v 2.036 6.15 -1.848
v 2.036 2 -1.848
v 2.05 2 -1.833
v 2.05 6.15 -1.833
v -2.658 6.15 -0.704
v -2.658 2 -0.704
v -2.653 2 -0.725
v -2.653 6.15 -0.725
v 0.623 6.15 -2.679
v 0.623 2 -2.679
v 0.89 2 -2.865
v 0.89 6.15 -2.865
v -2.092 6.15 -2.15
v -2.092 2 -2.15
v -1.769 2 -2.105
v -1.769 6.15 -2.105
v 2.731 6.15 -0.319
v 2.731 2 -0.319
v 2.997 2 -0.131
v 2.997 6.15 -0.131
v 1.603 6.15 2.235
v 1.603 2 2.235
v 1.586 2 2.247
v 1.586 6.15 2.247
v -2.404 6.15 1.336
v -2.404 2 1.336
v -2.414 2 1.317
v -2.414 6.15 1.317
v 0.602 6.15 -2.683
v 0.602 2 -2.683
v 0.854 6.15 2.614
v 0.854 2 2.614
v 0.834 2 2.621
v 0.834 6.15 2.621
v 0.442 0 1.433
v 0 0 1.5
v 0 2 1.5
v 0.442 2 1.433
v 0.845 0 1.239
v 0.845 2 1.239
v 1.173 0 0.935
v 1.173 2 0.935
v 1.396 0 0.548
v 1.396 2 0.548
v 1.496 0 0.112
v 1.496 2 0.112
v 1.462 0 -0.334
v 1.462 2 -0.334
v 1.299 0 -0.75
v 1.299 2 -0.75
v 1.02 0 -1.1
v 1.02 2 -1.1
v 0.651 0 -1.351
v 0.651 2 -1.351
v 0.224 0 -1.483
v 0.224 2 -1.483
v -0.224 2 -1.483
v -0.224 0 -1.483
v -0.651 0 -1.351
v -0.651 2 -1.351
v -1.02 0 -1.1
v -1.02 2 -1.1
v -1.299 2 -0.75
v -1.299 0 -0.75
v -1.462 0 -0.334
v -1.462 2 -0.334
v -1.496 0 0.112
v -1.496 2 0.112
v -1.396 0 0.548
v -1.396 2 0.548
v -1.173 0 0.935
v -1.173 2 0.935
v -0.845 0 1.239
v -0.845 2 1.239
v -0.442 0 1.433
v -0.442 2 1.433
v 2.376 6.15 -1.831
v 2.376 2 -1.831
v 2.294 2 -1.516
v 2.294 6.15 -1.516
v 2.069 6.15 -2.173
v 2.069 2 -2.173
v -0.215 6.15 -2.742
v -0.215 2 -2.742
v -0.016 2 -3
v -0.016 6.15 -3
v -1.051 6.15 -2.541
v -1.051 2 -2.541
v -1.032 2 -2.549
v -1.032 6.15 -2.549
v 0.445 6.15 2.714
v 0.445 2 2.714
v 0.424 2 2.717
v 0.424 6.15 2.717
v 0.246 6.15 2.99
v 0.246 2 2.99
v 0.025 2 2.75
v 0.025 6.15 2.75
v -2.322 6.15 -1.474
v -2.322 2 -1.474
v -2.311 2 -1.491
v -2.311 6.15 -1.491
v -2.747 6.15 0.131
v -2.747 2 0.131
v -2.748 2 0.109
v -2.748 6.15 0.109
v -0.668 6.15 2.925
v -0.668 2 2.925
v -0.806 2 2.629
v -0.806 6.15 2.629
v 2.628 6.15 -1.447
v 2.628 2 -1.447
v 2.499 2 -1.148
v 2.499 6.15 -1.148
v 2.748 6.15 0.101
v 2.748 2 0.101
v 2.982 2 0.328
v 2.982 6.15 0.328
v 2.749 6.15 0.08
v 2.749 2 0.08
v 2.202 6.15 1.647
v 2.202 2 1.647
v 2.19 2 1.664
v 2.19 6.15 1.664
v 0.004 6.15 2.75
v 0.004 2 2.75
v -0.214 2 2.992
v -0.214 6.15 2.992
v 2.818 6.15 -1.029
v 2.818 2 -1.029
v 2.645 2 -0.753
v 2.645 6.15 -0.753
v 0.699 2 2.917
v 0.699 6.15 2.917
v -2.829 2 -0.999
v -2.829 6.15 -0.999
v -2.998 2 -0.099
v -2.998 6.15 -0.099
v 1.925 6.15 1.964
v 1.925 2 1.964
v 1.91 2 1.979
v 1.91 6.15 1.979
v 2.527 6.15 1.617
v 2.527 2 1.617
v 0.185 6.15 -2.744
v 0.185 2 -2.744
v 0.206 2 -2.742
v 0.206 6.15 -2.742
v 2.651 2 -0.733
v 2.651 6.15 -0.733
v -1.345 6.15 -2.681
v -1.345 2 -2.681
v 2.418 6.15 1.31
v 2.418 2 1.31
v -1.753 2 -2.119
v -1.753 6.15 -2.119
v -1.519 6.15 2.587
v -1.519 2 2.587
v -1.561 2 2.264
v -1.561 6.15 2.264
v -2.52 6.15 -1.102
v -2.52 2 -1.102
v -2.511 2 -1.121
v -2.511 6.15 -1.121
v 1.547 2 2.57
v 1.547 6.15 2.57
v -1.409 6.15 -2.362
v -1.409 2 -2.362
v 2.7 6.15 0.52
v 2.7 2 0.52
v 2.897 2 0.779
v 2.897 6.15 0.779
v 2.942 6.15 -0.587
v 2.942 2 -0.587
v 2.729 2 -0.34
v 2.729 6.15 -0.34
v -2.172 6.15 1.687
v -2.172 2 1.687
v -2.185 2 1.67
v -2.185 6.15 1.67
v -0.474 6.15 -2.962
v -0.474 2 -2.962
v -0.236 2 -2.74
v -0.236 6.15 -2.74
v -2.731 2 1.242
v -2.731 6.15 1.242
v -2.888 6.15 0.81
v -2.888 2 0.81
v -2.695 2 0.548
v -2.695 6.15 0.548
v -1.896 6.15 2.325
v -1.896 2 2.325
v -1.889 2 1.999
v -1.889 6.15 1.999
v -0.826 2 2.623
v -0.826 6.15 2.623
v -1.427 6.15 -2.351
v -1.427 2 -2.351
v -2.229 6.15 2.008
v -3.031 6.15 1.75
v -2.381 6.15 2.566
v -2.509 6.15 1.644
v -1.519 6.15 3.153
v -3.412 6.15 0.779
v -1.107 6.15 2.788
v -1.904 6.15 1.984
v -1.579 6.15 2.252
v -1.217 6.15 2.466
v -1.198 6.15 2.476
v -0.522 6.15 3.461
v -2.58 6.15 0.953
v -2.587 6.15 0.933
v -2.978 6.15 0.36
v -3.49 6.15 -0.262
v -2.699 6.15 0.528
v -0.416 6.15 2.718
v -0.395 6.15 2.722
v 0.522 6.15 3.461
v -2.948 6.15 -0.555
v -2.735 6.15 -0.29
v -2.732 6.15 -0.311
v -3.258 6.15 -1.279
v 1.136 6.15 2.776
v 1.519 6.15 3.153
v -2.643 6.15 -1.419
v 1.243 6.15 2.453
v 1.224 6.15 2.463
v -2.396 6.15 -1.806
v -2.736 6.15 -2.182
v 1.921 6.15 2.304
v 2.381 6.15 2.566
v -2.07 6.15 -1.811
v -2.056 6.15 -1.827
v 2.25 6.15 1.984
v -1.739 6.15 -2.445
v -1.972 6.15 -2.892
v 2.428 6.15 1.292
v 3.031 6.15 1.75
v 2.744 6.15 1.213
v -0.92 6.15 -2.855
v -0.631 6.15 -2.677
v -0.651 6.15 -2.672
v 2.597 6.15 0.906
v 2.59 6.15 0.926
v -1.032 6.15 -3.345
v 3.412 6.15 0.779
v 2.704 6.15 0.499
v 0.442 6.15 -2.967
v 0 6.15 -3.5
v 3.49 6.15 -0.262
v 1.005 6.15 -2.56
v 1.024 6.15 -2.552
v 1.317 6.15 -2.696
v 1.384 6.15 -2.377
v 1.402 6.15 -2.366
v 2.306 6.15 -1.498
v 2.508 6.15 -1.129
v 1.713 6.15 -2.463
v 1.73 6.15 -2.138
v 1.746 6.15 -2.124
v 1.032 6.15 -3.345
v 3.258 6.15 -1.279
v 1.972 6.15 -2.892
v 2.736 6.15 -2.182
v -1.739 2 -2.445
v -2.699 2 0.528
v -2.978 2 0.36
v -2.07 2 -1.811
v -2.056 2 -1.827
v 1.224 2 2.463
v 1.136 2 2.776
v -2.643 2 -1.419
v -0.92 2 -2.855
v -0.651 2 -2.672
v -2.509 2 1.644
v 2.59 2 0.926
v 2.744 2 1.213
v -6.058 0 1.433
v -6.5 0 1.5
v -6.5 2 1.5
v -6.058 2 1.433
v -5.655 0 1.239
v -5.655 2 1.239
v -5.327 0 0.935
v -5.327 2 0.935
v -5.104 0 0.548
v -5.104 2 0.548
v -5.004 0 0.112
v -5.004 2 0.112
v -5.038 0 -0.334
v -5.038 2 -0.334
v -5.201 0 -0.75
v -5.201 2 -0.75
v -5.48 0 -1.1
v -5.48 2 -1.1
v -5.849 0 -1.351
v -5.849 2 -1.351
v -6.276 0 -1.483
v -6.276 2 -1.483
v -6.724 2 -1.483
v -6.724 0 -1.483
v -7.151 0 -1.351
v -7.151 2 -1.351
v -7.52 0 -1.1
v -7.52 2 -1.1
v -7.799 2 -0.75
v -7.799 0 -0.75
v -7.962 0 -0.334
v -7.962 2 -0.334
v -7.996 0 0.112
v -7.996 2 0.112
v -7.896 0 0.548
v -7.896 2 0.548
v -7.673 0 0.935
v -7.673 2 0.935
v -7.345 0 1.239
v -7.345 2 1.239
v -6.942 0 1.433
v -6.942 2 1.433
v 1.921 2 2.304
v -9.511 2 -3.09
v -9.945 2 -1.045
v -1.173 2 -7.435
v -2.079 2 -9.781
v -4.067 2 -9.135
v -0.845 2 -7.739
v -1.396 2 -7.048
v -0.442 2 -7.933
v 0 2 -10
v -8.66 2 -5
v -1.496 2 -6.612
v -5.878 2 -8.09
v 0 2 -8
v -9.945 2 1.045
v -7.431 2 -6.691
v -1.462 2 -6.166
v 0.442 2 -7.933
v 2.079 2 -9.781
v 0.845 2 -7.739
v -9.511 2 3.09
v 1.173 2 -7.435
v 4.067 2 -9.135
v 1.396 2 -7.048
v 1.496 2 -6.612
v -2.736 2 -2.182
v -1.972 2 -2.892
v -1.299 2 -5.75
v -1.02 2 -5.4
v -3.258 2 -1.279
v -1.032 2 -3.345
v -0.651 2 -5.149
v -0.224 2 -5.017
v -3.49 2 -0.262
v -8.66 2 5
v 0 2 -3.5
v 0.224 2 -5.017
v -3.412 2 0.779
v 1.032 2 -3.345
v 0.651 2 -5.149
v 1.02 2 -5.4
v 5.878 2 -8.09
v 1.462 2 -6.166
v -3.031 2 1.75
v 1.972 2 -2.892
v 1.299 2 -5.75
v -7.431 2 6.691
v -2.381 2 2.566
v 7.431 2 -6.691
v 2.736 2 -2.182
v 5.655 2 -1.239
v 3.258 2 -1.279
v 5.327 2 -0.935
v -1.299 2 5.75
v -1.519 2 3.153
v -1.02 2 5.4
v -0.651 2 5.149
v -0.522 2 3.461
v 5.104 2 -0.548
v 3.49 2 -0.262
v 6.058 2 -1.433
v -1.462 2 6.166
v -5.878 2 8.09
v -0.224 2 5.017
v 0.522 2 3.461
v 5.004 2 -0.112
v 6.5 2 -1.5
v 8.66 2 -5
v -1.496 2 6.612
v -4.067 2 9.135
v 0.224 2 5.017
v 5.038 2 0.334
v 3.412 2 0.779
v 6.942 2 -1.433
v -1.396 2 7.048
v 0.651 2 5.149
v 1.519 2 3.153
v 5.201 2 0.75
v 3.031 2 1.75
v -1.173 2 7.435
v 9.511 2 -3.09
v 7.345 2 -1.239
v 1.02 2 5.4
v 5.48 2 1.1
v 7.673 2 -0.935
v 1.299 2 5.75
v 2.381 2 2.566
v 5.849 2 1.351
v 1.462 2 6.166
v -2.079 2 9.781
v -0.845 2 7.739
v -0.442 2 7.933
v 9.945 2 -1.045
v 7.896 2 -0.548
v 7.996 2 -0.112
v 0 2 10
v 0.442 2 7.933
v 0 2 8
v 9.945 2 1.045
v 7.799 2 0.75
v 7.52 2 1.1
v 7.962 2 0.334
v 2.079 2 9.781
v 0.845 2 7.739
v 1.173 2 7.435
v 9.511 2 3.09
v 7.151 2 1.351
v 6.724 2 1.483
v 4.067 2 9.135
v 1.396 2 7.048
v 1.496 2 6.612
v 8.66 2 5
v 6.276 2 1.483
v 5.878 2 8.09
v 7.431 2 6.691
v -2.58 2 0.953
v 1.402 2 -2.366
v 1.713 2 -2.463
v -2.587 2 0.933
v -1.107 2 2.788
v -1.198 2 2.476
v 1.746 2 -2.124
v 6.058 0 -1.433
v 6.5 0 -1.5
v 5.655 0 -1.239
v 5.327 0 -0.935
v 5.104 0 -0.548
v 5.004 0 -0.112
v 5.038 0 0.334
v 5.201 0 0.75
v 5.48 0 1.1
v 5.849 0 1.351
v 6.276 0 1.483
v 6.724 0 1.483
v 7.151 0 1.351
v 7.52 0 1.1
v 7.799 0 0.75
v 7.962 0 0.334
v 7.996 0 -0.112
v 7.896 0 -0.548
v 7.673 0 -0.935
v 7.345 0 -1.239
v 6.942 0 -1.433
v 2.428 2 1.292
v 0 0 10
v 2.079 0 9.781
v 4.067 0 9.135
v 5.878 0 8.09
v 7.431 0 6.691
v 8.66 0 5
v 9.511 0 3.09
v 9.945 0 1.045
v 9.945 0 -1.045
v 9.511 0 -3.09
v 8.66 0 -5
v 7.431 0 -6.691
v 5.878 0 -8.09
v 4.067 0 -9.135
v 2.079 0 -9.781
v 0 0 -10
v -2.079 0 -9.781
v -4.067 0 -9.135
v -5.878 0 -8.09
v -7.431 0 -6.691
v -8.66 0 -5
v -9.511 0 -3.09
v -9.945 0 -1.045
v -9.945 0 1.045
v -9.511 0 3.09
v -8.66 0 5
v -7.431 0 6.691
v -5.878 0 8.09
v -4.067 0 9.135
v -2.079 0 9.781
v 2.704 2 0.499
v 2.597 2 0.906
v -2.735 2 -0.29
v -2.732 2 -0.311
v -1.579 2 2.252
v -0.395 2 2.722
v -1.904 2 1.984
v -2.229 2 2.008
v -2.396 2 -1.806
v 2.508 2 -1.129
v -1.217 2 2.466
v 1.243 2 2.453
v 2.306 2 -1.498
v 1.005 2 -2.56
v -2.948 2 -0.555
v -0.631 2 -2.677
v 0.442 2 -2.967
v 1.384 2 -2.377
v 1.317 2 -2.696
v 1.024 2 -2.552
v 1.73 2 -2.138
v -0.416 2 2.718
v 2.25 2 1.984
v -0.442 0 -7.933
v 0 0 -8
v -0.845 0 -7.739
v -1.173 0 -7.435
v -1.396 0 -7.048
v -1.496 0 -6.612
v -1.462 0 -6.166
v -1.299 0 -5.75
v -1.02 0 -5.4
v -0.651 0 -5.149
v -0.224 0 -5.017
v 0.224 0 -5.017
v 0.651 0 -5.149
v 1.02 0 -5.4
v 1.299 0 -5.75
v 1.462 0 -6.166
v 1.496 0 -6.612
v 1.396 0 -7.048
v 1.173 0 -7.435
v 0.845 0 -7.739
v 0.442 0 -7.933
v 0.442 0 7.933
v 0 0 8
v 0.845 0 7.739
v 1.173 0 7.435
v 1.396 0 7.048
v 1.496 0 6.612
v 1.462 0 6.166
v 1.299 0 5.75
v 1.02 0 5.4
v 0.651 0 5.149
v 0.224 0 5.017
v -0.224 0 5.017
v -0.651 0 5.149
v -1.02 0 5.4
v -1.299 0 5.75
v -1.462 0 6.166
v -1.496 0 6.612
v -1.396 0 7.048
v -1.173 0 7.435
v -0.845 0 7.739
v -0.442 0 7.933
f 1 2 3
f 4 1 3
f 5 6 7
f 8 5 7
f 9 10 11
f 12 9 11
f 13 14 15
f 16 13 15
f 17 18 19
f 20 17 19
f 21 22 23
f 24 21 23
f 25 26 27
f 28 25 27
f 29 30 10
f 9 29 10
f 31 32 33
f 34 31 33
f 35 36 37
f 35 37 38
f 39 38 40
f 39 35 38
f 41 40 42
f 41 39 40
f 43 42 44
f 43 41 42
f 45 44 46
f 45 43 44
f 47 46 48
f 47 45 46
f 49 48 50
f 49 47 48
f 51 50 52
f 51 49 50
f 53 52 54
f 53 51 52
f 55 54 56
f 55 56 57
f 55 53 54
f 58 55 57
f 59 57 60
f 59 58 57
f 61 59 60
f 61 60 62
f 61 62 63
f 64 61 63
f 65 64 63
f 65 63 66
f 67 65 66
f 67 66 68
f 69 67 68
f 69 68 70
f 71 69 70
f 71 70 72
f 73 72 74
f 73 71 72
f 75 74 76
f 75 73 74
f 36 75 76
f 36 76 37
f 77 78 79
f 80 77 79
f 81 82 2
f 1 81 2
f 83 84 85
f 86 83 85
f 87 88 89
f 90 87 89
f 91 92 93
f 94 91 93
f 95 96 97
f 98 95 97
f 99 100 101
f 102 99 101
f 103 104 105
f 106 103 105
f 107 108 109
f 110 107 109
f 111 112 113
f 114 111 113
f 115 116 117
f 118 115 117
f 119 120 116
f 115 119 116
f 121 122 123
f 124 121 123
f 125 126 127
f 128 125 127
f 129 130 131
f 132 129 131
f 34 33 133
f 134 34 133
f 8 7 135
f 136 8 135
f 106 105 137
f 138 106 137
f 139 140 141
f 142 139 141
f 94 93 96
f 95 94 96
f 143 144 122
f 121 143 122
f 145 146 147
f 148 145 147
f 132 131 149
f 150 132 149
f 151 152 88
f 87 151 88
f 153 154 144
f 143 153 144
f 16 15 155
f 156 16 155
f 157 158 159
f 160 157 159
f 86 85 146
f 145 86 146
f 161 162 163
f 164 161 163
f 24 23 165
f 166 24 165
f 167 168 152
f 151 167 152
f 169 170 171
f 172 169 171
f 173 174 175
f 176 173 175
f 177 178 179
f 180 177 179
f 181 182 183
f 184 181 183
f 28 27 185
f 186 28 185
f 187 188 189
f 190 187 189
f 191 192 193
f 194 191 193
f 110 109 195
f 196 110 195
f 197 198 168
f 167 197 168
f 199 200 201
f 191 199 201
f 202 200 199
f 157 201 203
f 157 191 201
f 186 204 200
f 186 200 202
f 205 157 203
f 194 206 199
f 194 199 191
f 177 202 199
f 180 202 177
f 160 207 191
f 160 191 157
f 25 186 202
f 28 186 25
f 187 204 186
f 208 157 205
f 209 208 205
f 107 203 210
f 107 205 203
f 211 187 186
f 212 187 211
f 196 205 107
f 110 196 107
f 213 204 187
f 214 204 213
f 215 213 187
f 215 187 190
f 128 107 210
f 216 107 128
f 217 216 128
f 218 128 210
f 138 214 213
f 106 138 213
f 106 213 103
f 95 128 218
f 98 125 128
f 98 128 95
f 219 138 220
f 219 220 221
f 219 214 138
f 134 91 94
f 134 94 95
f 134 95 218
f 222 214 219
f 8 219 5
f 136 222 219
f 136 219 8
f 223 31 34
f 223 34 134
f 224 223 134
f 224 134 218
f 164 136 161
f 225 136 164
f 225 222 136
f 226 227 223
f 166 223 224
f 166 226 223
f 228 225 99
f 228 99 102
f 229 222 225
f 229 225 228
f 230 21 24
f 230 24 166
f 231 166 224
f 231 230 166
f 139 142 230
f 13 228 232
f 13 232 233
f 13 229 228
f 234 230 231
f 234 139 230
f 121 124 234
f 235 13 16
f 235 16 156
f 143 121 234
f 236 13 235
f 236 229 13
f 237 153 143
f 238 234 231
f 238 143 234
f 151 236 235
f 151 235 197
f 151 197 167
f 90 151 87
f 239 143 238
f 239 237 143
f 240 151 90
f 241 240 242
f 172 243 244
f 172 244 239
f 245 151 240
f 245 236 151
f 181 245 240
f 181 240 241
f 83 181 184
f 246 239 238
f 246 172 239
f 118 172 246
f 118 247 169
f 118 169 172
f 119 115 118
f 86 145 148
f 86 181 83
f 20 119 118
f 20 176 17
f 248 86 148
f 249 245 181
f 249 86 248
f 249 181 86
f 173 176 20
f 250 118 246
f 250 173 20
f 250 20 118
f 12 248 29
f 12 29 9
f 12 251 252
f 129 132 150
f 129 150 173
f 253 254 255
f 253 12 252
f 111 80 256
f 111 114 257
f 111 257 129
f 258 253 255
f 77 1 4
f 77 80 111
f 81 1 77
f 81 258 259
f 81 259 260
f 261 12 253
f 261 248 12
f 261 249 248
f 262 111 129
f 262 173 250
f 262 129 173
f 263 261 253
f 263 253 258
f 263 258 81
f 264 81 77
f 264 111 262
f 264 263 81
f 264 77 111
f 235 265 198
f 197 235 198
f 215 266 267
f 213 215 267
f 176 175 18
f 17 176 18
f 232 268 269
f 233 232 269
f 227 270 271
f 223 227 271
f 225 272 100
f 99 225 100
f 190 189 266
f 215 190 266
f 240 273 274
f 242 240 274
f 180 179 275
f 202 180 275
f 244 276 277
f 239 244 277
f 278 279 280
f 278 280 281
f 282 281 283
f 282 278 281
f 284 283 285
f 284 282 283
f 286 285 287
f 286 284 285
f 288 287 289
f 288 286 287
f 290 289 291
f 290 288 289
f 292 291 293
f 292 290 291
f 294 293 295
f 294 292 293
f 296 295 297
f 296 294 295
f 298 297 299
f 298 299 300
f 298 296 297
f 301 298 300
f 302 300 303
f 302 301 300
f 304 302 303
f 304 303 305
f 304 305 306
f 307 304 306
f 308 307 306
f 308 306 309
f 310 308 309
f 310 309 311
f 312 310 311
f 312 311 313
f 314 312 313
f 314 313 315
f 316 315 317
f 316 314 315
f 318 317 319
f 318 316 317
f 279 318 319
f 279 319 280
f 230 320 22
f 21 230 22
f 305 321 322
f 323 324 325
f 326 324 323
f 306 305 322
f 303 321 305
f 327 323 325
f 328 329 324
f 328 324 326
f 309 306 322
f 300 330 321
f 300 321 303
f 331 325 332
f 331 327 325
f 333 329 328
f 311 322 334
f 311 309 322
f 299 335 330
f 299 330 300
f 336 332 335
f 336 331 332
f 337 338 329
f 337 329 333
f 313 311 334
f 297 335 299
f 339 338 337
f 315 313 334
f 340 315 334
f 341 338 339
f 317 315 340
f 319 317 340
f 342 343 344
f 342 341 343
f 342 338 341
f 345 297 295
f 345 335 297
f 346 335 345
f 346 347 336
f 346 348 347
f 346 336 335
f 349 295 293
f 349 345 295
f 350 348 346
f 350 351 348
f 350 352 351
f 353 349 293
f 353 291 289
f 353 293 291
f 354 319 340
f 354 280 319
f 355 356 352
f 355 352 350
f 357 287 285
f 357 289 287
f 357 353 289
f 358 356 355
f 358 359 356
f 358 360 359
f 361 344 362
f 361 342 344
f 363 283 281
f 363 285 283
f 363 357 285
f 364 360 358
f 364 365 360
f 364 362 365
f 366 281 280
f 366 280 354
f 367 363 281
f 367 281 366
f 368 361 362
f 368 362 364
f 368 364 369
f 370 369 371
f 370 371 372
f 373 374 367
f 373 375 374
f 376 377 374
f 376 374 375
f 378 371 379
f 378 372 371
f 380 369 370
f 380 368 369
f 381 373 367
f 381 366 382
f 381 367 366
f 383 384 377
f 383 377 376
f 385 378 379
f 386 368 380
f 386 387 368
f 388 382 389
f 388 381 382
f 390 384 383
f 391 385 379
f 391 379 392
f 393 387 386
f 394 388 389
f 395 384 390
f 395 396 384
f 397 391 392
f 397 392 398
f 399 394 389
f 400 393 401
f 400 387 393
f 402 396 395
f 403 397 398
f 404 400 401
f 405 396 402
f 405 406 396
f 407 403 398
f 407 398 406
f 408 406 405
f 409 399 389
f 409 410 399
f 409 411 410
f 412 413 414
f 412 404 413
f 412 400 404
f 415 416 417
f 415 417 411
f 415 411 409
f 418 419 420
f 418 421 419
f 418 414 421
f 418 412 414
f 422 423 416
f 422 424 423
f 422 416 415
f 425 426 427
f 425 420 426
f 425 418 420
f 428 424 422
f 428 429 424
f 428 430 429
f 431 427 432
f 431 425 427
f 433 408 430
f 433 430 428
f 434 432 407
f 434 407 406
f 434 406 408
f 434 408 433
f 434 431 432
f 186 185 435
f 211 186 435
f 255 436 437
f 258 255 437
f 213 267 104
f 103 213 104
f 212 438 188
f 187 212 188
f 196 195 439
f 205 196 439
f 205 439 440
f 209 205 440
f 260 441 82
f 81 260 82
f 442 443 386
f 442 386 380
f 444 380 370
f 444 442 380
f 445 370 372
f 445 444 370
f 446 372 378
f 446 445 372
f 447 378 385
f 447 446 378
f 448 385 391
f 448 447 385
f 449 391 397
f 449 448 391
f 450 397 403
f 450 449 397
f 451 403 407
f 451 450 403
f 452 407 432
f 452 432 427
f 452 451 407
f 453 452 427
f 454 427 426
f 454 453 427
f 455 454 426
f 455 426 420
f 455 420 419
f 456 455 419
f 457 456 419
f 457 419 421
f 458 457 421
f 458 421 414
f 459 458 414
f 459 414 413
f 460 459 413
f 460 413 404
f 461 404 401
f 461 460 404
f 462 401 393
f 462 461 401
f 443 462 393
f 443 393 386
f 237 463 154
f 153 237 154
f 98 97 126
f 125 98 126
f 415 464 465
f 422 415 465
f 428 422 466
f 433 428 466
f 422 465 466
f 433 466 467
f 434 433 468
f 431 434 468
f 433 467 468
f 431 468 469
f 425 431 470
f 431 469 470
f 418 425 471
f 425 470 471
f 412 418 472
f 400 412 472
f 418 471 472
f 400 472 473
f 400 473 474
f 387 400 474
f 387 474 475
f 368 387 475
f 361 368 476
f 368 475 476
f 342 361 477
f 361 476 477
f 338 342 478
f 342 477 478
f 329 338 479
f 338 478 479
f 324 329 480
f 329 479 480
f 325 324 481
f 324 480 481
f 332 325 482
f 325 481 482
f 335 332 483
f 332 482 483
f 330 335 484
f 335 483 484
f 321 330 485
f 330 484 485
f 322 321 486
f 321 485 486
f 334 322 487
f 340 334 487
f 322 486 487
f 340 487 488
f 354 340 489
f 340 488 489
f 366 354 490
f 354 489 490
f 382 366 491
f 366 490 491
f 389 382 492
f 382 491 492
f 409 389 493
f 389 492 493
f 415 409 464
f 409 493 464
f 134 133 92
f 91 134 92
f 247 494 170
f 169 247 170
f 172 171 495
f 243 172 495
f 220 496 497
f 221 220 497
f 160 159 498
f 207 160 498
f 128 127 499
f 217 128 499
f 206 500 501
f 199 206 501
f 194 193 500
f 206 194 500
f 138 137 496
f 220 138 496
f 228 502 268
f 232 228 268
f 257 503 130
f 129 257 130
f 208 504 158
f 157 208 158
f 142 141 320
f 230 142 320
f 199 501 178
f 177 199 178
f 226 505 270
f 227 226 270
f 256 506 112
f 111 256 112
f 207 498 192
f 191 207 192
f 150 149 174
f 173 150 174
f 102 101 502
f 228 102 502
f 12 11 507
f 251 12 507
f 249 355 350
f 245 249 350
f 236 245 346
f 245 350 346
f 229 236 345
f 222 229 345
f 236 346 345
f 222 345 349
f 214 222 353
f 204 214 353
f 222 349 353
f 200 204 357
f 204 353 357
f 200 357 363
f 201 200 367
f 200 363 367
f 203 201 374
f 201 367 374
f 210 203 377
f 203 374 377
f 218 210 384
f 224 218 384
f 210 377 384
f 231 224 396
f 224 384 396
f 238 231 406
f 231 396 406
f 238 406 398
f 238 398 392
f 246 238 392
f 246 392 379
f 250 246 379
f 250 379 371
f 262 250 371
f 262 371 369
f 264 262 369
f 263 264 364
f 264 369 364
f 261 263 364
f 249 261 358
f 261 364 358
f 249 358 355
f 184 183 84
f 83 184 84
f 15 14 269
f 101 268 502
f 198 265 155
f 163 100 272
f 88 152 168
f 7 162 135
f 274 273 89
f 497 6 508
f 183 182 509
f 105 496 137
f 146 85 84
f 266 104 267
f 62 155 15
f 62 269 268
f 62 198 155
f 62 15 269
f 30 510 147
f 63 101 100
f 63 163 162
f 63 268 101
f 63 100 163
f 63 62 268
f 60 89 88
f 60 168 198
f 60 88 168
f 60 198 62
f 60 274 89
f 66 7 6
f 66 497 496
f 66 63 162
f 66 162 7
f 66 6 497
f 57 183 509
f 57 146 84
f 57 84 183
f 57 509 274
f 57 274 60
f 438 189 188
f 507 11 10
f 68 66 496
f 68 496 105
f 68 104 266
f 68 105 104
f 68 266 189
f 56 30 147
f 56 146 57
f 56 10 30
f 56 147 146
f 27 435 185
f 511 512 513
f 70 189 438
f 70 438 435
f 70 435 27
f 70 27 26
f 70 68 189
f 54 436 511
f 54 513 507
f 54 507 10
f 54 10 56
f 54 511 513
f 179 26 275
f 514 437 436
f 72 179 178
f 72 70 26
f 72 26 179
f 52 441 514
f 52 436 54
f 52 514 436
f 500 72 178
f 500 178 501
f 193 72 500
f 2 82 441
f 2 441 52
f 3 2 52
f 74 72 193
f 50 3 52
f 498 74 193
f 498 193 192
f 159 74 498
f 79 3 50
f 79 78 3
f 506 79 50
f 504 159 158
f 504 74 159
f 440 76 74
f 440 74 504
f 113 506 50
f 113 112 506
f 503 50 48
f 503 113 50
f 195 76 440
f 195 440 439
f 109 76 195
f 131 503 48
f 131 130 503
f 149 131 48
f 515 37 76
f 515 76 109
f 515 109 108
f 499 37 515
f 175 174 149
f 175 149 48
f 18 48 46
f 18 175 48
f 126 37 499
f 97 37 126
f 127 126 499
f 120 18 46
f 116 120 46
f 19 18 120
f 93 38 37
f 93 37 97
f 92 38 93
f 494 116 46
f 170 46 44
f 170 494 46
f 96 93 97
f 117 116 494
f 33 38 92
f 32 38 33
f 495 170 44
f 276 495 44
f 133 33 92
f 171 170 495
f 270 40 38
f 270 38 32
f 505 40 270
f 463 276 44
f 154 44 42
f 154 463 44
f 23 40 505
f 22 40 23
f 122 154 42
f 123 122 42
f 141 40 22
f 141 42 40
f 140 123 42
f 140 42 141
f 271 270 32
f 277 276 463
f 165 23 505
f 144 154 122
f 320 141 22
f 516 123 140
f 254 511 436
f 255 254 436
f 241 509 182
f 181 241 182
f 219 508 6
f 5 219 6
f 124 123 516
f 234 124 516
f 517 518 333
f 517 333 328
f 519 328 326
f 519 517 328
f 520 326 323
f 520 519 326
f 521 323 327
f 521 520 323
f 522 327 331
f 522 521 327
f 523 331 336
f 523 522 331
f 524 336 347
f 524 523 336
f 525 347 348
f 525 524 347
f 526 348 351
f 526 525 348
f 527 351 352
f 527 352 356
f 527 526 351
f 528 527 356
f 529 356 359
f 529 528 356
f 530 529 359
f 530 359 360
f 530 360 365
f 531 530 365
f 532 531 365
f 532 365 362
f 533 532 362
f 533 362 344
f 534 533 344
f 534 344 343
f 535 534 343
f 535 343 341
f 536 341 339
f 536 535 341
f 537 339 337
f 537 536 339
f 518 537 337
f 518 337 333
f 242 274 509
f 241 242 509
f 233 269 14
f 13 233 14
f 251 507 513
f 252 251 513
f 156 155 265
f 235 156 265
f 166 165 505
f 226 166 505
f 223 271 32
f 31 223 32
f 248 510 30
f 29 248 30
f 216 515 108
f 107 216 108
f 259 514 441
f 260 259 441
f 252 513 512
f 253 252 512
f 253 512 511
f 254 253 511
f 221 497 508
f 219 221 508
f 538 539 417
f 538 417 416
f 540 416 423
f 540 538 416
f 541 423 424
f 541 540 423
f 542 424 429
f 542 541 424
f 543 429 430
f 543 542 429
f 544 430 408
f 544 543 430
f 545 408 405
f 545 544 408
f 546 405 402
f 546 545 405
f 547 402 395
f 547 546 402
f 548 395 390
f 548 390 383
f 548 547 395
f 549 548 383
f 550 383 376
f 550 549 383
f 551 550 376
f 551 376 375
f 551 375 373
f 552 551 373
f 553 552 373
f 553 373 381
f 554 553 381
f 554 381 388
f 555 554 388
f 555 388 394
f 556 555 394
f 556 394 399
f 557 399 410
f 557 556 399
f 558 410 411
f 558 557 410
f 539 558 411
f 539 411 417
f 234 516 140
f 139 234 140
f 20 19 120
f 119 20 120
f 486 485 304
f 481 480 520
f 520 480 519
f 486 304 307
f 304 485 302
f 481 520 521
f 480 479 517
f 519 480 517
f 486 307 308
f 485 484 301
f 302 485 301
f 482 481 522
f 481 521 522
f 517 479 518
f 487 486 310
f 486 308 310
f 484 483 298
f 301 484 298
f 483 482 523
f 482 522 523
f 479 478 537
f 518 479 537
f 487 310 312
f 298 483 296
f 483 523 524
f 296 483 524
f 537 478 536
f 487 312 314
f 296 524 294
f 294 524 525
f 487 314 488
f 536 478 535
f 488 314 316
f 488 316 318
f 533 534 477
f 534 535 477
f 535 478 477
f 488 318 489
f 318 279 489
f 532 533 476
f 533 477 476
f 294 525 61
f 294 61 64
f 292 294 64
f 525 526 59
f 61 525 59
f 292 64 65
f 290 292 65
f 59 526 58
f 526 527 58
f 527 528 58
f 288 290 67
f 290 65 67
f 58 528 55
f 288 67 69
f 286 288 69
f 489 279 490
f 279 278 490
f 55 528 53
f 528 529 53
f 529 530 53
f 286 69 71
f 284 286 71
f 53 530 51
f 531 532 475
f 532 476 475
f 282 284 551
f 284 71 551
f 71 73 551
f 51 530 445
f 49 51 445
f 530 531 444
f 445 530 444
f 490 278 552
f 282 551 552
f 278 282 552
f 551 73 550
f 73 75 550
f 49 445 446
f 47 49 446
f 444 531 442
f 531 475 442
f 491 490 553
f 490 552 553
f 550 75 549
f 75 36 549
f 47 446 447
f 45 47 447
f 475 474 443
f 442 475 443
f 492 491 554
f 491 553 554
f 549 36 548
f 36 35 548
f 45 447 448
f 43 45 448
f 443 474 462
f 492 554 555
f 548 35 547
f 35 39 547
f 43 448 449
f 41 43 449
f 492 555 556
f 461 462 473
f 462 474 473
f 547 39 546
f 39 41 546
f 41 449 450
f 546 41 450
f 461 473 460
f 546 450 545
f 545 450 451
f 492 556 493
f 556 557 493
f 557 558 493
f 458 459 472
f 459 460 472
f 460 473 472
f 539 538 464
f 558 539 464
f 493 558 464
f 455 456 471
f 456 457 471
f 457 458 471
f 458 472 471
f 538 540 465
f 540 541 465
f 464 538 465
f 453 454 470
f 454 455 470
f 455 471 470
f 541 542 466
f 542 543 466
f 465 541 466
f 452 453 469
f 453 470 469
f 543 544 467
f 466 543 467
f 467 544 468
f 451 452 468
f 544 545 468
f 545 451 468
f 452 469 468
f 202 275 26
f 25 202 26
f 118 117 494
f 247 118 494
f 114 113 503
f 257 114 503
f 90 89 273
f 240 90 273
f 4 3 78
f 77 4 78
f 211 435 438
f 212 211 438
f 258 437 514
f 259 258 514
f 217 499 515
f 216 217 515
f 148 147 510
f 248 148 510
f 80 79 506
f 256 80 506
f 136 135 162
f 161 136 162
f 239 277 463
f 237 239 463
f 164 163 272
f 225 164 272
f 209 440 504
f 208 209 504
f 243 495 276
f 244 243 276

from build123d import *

# Parameters (mm, degrees)
SKETCH1_R           = 10
SKETCH1_R_2         = 1.5
BOSS_EXTRUDE1_DEPTH = 2
SKETCH2_R           = 3.5
SKETCH2_R_2         = 3
BOSS_EXTRUDE2_DEPTH = 4.15
BOSS_EXTRUDE3_START = -4.15
BOSS_EXTRUDE3_DEPTH = 4.15


with BuildPart() as part:
    # Sketch1 → Boss-Extrude1 (new body)
    with BuildSketch(Plane(origin=(0, 0, 0), x_dir=(1, 0, 0), z_dir=(0, 1, 0))):
        with Locations(Location((0, 0, 0), (0, 0, 270))):
            Circle(SKETCH1_R)
        with Locations(Location((0, 0, 0), (0, 0, 270))):
            Circle(SKETCH1_R_2, mode=Mode.SUBTRACT)
        with Locations(Location((-6.5, 0, 0), (0, 0, 270))):
            Circle(SKETCH1_R_2, mode=Mode.SUBTRACT)
        with Locations(Location((0, -6.5, 0), (0, 0, 270))):
            Circle(SKETCH1_R_2, mode=Mode.SUBTRACT)
        with Locations(Location((6.5, 0, 0), (0, 0, 90))):
            Circle(SKETCH1_R_2, mode=Mode.SUBTRACT)
        with Locations(Location((0, 6.5, 0), (0, 0, 90))):
            Circle(SKETCH1_R_2, mode=Mode.SUBTRACT)
    extrude(amount=BOSS_EXTRUDE1_DEPTH)

    # Sketch2 → Boss-Extrude2 (add)
    with BuildSketch(Plane(origin=(0, 2, 0), x_dir=(1, 0, 0), z_dir=(0, 1, 0))):
        with Locations(Location((0, 0, 0), (0, 0, 90))):
            Circle(SKETCH2_R)
        with Locations(Location((0, 0, 0), (0, 0, 90))):
            Circle(SKETCH2_R_2, mode=Mode.SUBTRACT)
    extrude(amount=BOSS_EXTRUDE2_DEPTH)

    # Sketch5 → Boss-Extrude3 (add)
    with BuildSketch(Plane(origin=(0, 6.15, 0), x_dir=(1, 0, 0), z_dir=(0, 1, 0)).offset(BOSS_EXTRUDE3_START)):
        with BuildLine():
            ThreePointArc((-2.828791658, 0.998968346), (-2.896961701, 0.779495286), (-2.948131221, 0.555447838))
            Line((-2.948131221, 0.555447838), (-2.658267303, 0.704354274))
            Line((-2.658267303, 0.704354274), (-2.652790141, 0.724709921))
            Line((-2.652790141, 0.724709921), (-2.828791658, 0.998968346))
        make_face()
        with BuildLine():
            ThreePointArc((-2.643147616, 1.419073882), (-2.74402114, 1.212579062), (-2.828791658, 0.998968346))
            Line((-2.828791658, 0.998968346), (-2.519594361, 1.101882142))
            Line((-2.519594361, 1.101882142), (-2.511074114, 1.121163144))
            Line((-2.511074114, 1.121163144), (-2.643147616, 1.419073882))
        make_face()
        with BuildLine():
            Line((-2.732327015, 0.311270112), (-2.948131221, 0.555447838))
            ThreePointArc((-2.948131221, 0.555447838), (-2.981999935, 0.328140802), (-2.998369088, 0.098908104))
            Line((-2.998369088, 0.098908104), (-2.734632713, 0.29031694))
            Line((-2.734632713, 0.29031694), (-2.732327015, 0.311270112))
        make_face()
        with BuildLine():
            Line((-2.74782046, -0.109465605), (-2.998369088, 0.098908104))
            ThreePointArc((-2.998369088, 0.098908104), (-2.997142618, -0.130905025), (-2.978327724, -0.359949952))
            Line((-2.978327724, -0.359949952), (-2.746900649, -0.130525178))
            Line((-2.746900649, -0.130525178), (-2.74782046, -0.109465605))
        make_face()
        with BuildLine():
            Line((-2.698907323, -0.527635541), (-2.978327724, -0.359949952))
            ThreePointArc((-2.978327724, -0.359949952), (-2.942034819, -0.586882549), (-2.888476883, -0.810371086))
            Line((-2.888476883, -0.810371086), (-2.694783563, -0.548307896))
            Line((-2.694783563, -0.548307896), (-2.698907323, -0.527635541))
        make_face()
        with BuildLine():
            Line((-2.586734085, -0.933438147), (-2.888476883, -0.810371086))
            ThreePointArc((-2.888476883, -0.810371086), (-2.817968216, -1.029104043), (-2.730922592, -1.241797809))
            Line((-2.730922592, -1.241797809), (-2.579503034, -0.953238742))
            Line((-2.579503034, -0.953238742), (-2.586734085, -0.933438147))
        make_face()
        with BuildLine():
            Line((-2.184545427, -1.670407518), (-2.509357789, -1.644117844))
            ThreePointArc((-2.509357789, -1.644117844), (-2.376138842, -1.831383139), (-2.228975768, -2.00790115))
            Line((-2.228975768, -2.00790115), (-2.171677122, -1.687103577))
            Line((-2.171677122, -1.687103577), (-2.184545427, -1.670407518))
        make_face()
        with BuildLine():
            Line((-2.413929992, -1.317361754), (-2.730922592, -1.241797809))
            ThreePointArc((-2.730922592, -1.241797809), (-2.627850827, -1.447204211), (-2.509357789, -1.644117844))
            Line((-2.509357789, -1.644117844), (-2.40376114, -1.33582648))
            Line((-2.40376114, -1.33582648), (-2.413929992, -1.317361754))
        make_face()
        with BuildLine():
            Line((-1.903956968, -1.984300346), (-2.228975768, -2.00790115))
            ThreePointArc((-2.228975768, -2.00790115), (-2.068732177, -2.172635998), (-1.896348443, -2.324620955))
            Line((-1.896348443, -2.324620955), (-1.888690833, -1.998836396))
            Line((-1.888690833, -1.998836396), (-1.903956968, -1.984300346))
        make_face()
        with BuildLine():
            Line((-1.578741372, -2.251682855), (-1.896348443, -2.324620955))
            ThreePointArc((-1.896348443, -2.324620955), (-1.712836182, -2.462964111), (-1.519272318, -2.586853615))
            Line((-1.519272318, -2.586853615), (-1.561435232, -2.263718184))
            Line((-1.561435232, -2.263718184), (-1.578741372, -2.251682855))
        make_face()
        with BuildLine():
            Line((-1.216521416, -2.466287827), (-1.519272318, -2.586853615))
            ThreePointArc((-1.519272318, -2.586853615), (-1.316792759, -2.695562433), (-1.106585738, -2.788452618))
            Line((-1.106585738, -2.788452618), (-1.197580912, -2.475540337))
            Line((-1.197580912, -2.475540337), (-1.216521416, -2.466287827))
        make_face()
        with BuildLine():
            Line((-0.825787229, -2.623085102), (-1.106585738, -2.788452618))
            ThreePointArc((-1.106585738, -2.788452618), (-0.88988483, -2.864979056), (-0.667961725, -2.924692656))
            Line((-0.667961725, -2.924692656), (-0.805656311, -2.629337922))
            Line((-0.805656311, -2.629337922), (-0.825787229, -2.623085102))
        make_face()
        with BuildLine():
            Line((-0.41569729, -2.718399486), (-0.667961725, -2.924692656))
            ThreePointArc((-0.667961725, -2.924692656), (-0.442118755, -2.967242998), (-0.213681256, -2.992380377))
            Line((-0.213681256, -2.992380377), (-0.394847808, -2.721506055))
            Line((-0.394847808, -2.721506055), (-0.41569729, -2.718399486))
        make_face()
        with BuildLine():
            Line((0.004136242, -2.749996889), (-0.213681256, -2.992380377))
            ThreePointArc((-0.213681256, -2.992380377), (0.016010209, -2.999957279), (0.24560772, -2.989929238))
            Line((0.24560772, -2.989929238), (0.025215592, -2.749884393))
            Line((0.025215592, -2.749884393), (0.004136242, -2.749996889))
        make_face()
        with BuildLine():
            Line((0.423872824, -2.717136697), (0.24560772, -2.989929238))
            ThreePointArc((0.24560772, -2.989929238), (0.473763907, -2.962355104), (0.69913986, -2.917396692))
            Line((0.69913986, -2.917396692), (0.44468796, -2.713807771))
            Line((0.44468796, -2.713807771), (0.423872824, -2.717136697))
        make_face()
        with BuildLine():
            Line((0.833674186, -2.620589123), (0.69913986, -2.917396692))
            ThreePointArc((0.69913986, -2.917396692), (0.920412981, -2.855317836), (1.136284754, -2.77648284))
            Line((1.136284754, -2.77648284), (0.85373722, -2.614121795))
            Line((0.85373722, -2.614121795), (0.833674186, -2.620589123))
        make_face()
        with BuildLine():
            Line((1.223934931, -2.462617161), (1.136284754, -2.77648284))
            ThreePointArc((1.136284754, -2.77648284), (1.345488355, -2.681354338), (1.546796096, -2.570490583))
            Line((1.546796096, -2.570490583), (1.242775602, -2.45316302))
            Line((1.242775602, -2.45316302), (1.223934931, -2.462617161))
        make_face()
        with BuildLine():
            Line((1.58550768, -2.246923541), (1.546796096, -2.570490583))
            ThreePointArc((1.546796096, -2.570490583), (1.739026622, -2.444542167), (1.921051849, -2.304248206))
            Line((1.921051849, -2.304248206), (1.602684378, -2.234704183))
            Line((1.602684378, -2.234704183), (1.58550768, -2.246923541))
        make_face()
        with BuildLine():
            Line((1.909917472, -1.978563936), (1.921051849, -2.304248206))
            ThreePointArc((1.921051849, -2.304248206), (2.091803579, -2.150432), (2.250279774, -1.983996204))
            Line((2.250279774, -1.983996204), (1.92502759, -1.963865774))
            Line((1.92502759, -1.963865774), (1.909917472, -1.978563936))
        make_face()
        with BuildLine():
            Line((2.189560417, -1.663828471), (2.250279774, -1.983996204))
            ThreePointArc((2.250279774, -1.983996204), (2.395550433, -1.805917529), (2.52676305, -1.617241012))
            Line((2.52676305, -1.617241012), (2.202249787, -1.646996016))
            Line((2.202249787, -1.646996016), (2.189560417, -1.663828471))
        make_face()
        with BuildLine():
            Line((2.417881922, -1.310094276), (2.52676305, -1.617241012))
            ThreePointArc((2.52676305, -1.617241012), (2.643147616, -1.419073882), (2.74402114, -1.212579062))
            Line((2.74402114, -1.212579062), (2.427853116, -1.291522067))
            Line((2.427853116, -1.291522067), (2.417881922, -1.310094276))
        make_face()
        with BuildLine():
            Line((2.589530324, -0.925652581), (2.74402114, -1.212579062))
            ThreePointArc((2.74402114, -1.212579062), (2.828791658, -0.998968346), (2.896961701, -0.779495286))
            Line((2.896961701, -0.779495286), (2.596549625, -0.905775935))
            Line((2.596549625, -0.905775935), (2.589530324, -0.925652581))
        make_face()
        with BuildLine():
            Line((2.70048233, -0.519514375), (2.896961701, -0.779495286))
            ThreePointArc((2.896961701, -0.779495286), (2.948131221, -0.555447838), (2.981999935, -0.328140802))
            Line((2.981999935, -0.328140802), (2.704385212, -0.498799183))
            Line((2.704385212, -0.498799183), (2.70048233, -0.519514375))
        make_face()
        with BuildLine():
            ThreePointArc((3, 0), (2.99928557, 0.065468103), (2.997142618, 0.130905025))
            Line((2.997142618, 0.130905025), (2.748832302, -0.080131001))
            Line((2.748832302, -0.080131001), (2.748137319, -0.101199192))
            Line((2.748137319, -0.101199192), (2.981999935, -0.328140802))
            ThreePointArc((2.981999935, -0.328140802), (2.995496604, -0.164317063), (3, 0))
        make_face()
        with BuildLine():
            ThreePointArc((2.997142618, 0.130905025), (2.978327724, 0.359949952), (2.942034819, 0.586882549))
            Line((2.942034819, 0.586882549), (2.728849092, 0.340415383))
            Line((2.728849092, 0.340415383), (2.731378298, 0.319488015))
            Line((2.731378298, 0.319488015), (2.997142618, 0.130905025))
        make_face()
        with BuildLine():
            ThreePointArc((2.942034819, 0.586882549), (2.888476883, 0.810371086), (2.817968216, 1.029104043))
            Line((2.817968216, 1.029104043), (2.644903972, 0.75298272))
            Line((2.644903972, 0.75298272), (2.650598085, 0.732686693))
            Line((2.650598085, 0.732686693), (2.942034819, 0.586882549))
        make_face()
        with BuildLine():
            ThreePointArc((2.817968216, 1.029104043), (2.730922592, 1.241797809), (2.627850827, 1.447204211))
            Line((2.627850827, 1.447204211), (2.498964545, 1.14790078))
            Line((2.498964545, 1.14790078), (2.5076901, 1.128711816))
            Line((2.5076901, 1.128711816), (2.817968216, 1.029104043))
        make_face()
        with BuildLine():
            ThreePointArc((2.627850827, 1.447204211), (2.509357789, 1.644117844), (2.376138842, 1.831383139))
            Line((2.376138842, 1.831383139), (2.294451508, 1.515913018))
            Line((2.294451508, 1.515913018), (2.306003984, 1.49828089))
            Line((2.306003984, 1.49828089), (2.627850827, 1.447204211))
        make_face()
        with BuildLine():
            ThreePointArc((2.376138842, 1.831383139), (2.228975768, 2.00790115), (2.068732177, 2.172635998))
            Line((2.068732177, 2.172635998), (2.036158471, 1.848393541))
            Line((2.036158471, 1.848393541), (2.050267089, 1.832731531))
            Line((2.050267089, 1.832731531), (2.376138842, 1.831383139))
        make_face()
        with BuildLine():
            ThreePointArc((2.068732177, 2.172635998), (1.896348443, 2.324620955), (1.712836182, 2.462964111))
            Line((1.712836182, 2.462964111), (1.730139606, 2.137549285))
            Line((1.730139606, 2.137549285), (1.746473671, 2.124224497))
            Line((1.746473671, 2.124224497), (2.068732177, 2.172635998))
        make_face()
        with BuildLine():
            ThreePointArc((1.712836182, 2.462964111), (1.519272318, 2.586853615), (1.316792759, 2.695562433))
            Line((1.316792759, 2.695562433), (1.383567734, 2.376602685))
            Line((1.383567734, 2.376602685), (1.401744391, 2.365927442))
            Line((1.401744391, 2.365927442), (1.712836182, 2.462964111))
        make_face()
        with BuildLine():
            ThreePointArc((1.316792759, 2.695562433), (1.106585738, 2.788452618), (0.88988483, 2.864979056))
            Line((0.88988483, 2.864979056), (1.004566208, 2.559950533))
            Line((1.004566208, 2.559950533), (1.02415941, 2.552175053))
            Line((1.02415941, 2.552175053), (1.316792759, 2.695562433))
        make_face()
        with BuildLine():
            ThreePointArc((0.88988483, 2.864979056), (0.667961725, 2.924692656), (0.442118755, 2.967242998))
            Line((0.442118755, 2.967242998), (0.602018501, 2.683295311))
            Line((0.602018501, 2.683295311), (0.622569001, 2.678601844))
            Line((0.622569001, 2.678601844), (0.88988483, 2.864979056))
        make_face()
        with BuildLine():
            ThreePointArc((0.442118755, 2.967242998), (0.213681256, 2.992380377), (-0.016010209, 2.999957279))
            Line((-0.016010209, 2.999957279), (0.185359991, 2.74374592))
            Line((0.185359991, 2.74374592), (0.206386102, 2.742244478))
            Line((0.206386102, 2.742244478), (0.442118755, 2.967242998))
        make_face()
        with BuildLine():
            ThreePointArc((-0.016010209, 2.999957279), (-0.24560772, 2.989929238), (-0.473763907, 2.962355104))
            Line((-0.473763907, 2.962355104), (-0.2356432, 2.739885451))
            Line((-0.2356432, 2.739885451), (-0.214634313, 2.741611226))
            Line((-0.214634313, 2.741611226), (-0.016010209, 2.999957279))
        make_face()
        with BuildLine():
            ThreePointArc((-0.473763907, 2.962355104), (-0.69913986, 2.917396692), (-0.920412981, 2.855317836))
            Line((-0.920412981, 2.855317836), (-0.651123115, 2.671804388))
            Line((-0.651123115, 2.671804388), (-0.630623881, 2.67671693))
            Line((-0.630623881, 2.67671693), (-0.473763907, 2.962355104))
        make_face()
        with BuildLine():
            ThreePointArc((-0.920412981, 2.855317836), (-1.136284754, 2.77648284), (-1.345488355, 2.681354338))
            Line((-1.345488355, 2.681354338), (-1.051341255, 2.541098496))
            Line((-1.051341255, 2.541098496), (-1.031832159, 2.549082658))
            Line((-1.031832159, 2.549082658), (-0.920412981, 2.855317836))
        make_face()
        with BuildLine():
            ThreePointArc((-1.345488355, 2.681354338), (-1.546796096, 2.570490583), (-1.739026622, 2.444542167))
            Line((-1.739026622, 2.444542167), (-1.426916848, 2.350831408))
            Line((-1.426916848, 2.350831408), (-1.408855167, 2.361700048))
            Line((-1.408855167, 2.361700048), (-1.345488355, 2.681354338))
        make_face()
        with BuildLine():
            ThreePointArc((-1.739026622, 2.444542167), (-1.921051849, 2.304248206), (-2.091803579, 2.150432))
            Line((-2.091803579, 2.150432), (-1.769046719, 2.105462825))
            Line((-1.769046719, 2.105462825), (-1.752855803, 2.118961192))
            Line((-1.752855803, 2.118961192), (-1.739026622, 2.444542167))
        make_face()
        with BuildLine():
            ThreePointArc((-2.091803579, 2.150432), (-2.250279774, 1.983996204), (-2.395550433, 1.805917529))
            Line((-2.395550433, 1.805917529), (-2.069711634, 1.810743978))
            Line((-2.069711634, 1.810743978), (-2.055770985, 1.826555681))
            Line((-2.055770985, 1.826555681), (-2.091803579, 2.150432))
        make_face()
        with BuildLine():
            ThreePointArc((-2.395550433, 1.805917529), (-2.52676305, 1.617241012), (-2.643147616, 1.419073882))
            Line((-2.643147616, 1.419073882), (-2.321864263, 1.473582826))
            Line((-2.321864263, 1.473582826), (-2.310500638, 1.491337253))
            Line((-2.310500638, 1.491337253), (-2.395550433, 1.805917529))
        make_face()
    extrude(amount=BOSS_EXTRUDE3_DEPTH)


solid = part.part
